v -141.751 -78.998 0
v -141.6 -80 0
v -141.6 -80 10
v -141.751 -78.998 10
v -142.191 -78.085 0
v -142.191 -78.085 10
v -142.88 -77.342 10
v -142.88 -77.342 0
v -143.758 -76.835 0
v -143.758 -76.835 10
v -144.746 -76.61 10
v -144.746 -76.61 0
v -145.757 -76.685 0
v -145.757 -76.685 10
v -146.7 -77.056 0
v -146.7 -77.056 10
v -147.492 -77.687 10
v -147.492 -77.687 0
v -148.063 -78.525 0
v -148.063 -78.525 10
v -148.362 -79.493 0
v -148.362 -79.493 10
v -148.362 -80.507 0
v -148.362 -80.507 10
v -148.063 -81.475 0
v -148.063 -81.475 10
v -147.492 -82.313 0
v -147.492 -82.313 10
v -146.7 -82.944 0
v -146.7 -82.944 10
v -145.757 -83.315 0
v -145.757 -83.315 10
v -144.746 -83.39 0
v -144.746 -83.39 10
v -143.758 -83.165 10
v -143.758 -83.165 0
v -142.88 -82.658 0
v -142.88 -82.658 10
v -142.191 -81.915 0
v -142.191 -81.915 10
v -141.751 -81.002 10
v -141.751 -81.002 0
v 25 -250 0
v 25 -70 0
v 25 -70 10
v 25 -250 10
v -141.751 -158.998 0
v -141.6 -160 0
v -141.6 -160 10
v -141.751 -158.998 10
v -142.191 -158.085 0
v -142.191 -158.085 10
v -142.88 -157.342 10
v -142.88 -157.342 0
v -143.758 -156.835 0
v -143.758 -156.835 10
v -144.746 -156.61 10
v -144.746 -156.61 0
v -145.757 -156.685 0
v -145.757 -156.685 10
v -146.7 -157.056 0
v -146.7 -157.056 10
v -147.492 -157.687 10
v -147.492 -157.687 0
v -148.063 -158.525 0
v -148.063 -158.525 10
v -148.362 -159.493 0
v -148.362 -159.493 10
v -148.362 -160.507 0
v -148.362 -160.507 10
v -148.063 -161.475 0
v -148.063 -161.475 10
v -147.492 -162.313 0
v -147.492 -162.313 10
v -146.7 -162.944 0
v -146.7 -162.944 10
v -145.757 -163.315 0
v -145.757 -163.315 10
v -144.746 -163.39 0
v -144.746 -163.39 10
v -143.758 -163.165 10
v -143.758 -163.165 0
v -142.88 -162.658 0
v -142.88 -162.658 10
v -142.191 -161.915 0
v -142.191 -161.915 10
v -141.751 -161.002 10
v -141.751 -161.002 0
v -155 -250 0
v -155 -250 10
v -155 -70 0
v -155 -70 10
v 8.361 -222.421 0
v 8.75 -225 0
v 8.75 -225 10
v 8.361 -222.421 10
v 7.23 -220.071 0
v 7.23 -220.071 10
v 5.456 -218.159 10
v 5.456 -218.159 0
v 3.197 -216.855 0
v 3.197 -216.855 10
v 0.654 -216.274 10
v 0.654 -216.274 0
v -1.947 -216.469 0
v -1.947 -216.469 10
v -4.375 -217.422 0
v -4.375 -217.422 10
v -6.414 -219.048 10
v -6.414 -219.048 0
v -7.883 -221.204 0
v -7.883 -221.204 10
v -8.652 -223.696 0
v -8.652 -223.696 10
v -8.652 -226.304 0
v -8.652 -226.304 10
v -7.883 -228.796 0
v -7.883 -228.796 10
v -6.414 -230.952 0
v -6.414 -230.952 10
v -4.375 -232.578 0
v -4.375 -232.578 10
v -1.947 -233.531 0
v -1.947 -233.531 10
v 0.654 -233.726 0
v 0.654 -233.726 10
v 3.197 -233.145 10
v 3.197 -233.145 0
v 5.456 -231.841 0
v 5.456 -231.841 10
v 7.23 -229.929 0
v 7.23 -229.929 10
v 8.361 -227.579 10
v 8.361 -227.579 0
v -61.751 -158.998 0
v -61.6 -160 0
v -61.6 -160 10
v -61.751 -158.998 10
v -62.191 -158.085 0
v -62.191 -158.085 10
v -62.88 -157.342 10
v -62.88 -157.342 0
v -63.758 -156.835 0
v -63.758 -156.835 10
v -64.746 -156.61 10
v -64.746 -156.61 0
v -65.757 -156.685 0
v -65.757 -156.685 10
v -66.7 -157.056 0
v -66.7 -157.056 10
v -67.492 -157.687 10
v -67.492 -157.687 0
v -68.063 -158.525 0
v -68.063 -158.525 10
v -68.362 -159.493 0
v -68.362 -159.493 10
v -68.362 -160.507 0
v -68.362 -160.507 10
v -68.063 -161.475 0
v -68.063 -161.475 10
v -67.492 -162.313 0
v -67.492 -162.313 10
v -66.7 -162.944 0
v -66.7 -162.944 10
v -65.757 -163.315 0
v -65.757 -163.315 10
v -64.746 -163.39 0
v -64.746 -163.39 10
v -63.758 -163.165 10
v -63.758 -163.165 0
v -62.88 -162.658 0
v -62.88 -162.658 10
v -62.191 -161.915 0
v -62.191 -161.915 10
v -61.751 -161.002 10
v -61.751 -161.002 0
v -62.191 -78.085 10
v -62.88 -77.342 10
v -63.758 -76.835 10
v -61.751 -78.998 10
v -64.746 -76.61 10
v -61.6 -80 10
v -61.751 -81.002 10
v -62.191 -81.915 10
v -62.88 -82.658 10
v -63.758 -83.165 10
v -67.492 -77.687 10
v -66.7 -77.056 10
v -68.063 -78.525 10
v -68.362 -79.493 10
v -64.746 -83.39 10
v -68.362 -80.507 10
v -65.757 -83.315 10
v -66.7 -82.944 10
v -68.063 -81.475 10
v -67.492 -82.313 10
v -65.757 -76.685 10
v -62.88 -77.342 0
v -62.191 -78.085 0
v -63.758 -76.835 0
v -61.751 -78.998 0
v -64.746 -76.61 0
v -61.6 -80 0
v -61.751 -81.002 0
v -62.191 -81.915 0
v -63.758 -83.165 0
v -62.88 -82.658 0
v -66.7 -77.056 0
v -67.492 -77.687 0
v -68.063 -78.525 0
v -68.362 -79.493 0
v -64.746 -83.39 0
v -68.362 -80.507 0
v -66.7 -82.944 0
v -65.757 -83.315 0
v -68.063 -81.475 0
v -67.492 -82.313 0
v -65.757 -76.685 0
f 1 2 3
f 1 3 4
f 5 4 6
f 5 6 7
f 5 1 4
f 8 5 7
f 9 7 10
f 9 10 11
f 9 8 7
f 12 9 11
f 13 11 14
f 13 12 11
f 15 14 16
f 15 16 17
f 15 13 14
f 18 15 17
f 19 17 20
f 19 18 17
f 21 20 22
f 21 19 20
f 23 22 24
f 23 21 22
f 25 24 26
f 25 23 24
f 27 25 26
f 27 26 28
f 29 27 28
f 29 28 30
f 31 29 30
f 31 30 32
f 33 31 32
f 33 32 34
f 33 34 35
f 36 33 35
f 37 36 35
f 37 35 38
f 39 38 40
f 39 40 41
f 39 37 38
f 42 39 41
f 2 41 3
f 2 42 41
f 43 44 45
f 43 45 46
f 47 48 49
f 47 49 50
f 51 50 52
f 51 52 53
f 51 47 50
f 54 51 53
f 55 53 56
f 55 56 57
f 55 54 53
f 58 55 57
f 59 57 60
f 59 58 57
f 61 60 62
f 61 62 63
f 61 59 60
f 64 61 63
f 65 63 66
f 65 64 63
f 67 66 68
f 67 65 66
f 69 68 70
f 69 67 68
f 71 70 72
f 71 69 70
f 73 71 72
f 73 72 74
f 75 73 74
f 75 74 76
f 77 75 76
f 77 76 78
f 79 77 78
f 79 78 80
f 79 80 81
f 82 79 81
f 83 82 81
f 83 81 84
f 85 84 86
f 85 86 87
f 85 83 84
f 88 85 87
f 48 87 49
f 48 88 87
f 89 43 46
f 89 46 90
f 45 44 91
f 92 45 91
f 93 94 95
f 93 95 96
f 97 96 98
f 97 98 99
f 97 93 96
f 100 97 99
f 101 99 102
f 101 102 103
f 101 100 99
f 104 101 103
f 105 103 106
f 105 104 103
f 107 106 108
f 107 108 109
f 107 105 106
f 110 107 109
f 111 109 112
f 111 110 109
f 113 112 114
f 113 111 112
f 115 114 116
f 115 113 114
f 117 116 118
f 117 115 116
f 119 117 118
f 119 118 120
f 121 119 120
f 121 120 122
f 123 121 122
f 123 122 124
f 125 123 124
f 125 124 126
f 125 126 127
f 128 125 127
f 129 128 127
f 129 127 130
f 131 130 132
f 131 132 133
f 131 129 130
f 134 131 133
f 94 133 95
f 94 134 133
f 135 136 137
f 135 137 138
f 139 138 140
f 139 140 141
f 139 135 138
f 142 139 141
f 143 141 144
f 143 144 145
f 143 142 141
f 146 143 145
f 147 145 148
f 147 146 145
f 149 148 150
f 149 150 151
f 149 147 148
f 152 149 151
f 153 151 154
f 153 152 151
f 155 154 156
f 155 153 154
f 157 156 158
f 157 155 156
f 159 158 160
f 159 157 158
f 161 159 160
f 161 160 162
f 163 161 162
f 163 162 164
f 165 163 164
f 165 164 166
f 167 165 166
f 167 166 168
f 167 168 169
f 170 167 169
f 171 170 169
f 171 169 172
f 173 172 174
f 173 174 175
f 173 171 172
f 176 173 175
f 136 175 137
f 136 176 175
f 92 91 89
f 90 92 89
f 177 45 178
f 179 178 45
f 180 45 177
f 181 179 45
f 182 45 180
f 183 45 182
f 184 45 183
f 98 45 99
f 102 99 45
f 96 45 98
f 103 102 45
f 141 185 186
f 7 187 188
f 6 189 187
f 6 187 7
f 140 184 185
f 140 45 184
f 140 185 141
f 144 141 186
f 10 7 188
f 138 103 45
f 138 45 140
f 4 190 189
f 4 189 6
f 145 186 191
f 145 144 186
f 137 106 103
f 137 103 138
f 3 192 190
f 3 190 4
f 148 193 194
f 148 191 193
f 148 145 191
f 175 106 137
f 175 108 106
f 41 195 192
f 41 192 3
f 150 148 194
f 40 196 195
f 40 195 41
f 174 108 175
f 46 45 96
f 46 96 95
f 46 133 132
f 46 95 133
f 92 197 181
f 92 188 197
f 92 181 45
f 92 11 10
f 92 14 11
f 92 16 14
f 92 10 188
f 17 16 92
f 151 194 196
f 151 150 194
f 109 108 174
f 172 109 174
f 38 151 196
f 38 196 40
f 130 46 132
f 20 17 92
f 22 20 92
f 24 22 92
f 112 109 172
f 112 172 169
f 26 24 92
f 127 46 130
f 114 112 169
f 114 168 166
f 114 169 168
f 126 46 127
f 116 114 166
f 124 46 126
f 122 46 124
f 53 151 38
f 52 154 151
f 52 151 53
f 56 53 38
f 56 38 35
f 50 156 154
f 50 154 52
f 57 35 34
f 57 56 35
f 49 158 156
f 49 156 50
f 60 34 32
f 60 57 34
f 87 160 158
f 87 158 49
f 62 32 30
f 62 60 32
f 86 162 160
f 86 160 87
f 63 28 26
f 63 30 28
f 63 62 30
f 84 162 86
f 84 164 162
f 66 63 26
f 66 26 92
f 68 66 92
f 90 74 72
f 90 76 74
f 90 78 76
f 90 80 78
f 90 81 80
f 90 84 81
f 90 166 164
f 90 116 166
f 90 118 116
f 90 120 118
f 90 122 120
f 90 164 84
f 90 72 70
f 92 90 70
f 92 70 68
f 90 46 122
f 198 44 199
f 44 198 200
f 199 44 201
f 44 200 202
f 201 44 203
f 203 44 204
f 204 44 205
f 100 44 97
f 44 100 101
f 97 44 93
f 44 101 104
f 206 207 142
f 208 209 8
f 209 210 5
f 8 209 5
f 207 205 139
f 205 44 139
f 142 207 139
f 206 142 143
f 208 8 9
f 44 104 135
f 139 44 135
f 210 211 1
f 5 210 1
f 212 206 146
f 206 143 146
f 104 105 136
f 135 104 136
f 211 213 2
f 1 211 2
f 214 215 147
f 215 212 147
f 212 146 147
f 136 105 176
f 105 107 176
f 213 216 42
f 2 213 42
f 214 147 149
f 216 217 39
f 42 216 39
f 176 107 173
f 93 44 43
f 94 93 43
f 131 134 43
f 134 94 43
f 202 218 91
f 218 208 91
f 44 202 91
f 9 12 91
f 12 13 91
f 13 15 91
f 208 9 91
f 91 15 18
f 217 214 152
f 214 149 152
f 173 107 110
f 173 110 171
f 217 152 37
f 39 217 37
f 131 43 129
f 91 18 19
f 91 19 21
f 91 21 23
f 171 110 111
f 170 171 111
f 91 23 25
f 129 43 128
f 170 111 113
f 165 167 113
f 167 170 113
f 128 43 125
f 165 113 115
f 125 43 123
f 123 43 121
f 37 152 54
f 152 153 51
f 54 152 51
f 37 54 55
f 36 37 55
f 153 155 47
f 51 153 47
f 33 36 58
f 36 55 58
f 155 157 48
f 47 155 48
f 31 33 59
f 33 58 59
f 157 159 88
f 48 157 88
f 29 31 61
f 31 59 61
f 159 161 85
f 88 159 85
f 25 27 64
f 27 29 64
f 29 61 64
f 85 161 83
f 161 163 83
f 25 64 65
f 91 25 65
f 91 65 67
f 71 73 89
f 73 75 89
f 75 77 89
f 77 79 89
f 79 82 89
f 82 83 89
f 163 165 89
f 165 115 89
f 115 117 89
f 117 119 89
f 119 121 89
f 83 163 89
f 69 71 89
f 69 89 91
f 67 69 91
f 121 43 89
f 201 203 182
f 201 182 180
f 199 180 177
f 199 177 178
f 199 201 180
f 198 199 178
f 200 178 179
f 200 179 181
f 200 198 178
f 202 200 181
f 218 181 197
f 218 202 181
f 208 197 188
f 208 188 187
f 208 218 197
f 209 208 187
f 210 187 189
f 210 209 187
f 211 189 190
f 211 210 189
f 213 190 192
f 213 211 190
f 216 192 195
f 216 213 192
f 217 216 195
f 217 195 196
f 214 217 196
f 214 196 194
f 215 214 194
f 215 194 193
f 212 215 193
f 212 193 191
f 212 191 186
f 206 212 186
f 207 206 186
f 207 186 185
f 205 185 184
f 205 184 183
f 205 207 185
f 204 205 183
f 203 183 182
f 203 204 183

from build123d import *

# Parameters (mm, degrees)
SKETCH_1_W      = 180
SKETCH_1_H      = 180
SKETCH_1_R      = 3.4
SKETCH_1_R_2    = 8.75
EXTRUDE_1_DEPTH = 10


with BuildPart() as part:
    # 草图1 → 凸台-拉伸1 (new body)
    with BuildSketch(Plane(origin=(0, 0, 0), x_dir=(-1, 0, 0), z_dir=(0, 0, 1))):
        with Locations((65, 160)):
            Rectangle(SKETCH_1_W, SKETCH_1_H)
        with Locations(Location((145, 160, 0), (0, 0, 180))):
            Circle(SKETCH_1_R, mode=Mode.SUBTRACT)
        with Locations(Location((65, 160, 0), (0, 0, 180))):
            Circle(SKETCH_1_R, mode=Mode.SUBTRACT)
        with Locations(Location((0, 225, 0), (0, 0, 180))):
            Circle(SKETCH_1_R_2, mode=Mode.SUBTRACT)
        with Locations(Location((145, 80, 0), (0, 0, 180))):
            Circle(SKETCH_1_R, mode=Mode.SUBTRACT)
        with Locations(Location((65, 80, 0), (0, 0, 180))):
            Circle(SKETCH_1_R, mode=Mode.SUBTRACT)
    extrude(amount=EXTRUDE_1_DEPTH)


solid = part.part
